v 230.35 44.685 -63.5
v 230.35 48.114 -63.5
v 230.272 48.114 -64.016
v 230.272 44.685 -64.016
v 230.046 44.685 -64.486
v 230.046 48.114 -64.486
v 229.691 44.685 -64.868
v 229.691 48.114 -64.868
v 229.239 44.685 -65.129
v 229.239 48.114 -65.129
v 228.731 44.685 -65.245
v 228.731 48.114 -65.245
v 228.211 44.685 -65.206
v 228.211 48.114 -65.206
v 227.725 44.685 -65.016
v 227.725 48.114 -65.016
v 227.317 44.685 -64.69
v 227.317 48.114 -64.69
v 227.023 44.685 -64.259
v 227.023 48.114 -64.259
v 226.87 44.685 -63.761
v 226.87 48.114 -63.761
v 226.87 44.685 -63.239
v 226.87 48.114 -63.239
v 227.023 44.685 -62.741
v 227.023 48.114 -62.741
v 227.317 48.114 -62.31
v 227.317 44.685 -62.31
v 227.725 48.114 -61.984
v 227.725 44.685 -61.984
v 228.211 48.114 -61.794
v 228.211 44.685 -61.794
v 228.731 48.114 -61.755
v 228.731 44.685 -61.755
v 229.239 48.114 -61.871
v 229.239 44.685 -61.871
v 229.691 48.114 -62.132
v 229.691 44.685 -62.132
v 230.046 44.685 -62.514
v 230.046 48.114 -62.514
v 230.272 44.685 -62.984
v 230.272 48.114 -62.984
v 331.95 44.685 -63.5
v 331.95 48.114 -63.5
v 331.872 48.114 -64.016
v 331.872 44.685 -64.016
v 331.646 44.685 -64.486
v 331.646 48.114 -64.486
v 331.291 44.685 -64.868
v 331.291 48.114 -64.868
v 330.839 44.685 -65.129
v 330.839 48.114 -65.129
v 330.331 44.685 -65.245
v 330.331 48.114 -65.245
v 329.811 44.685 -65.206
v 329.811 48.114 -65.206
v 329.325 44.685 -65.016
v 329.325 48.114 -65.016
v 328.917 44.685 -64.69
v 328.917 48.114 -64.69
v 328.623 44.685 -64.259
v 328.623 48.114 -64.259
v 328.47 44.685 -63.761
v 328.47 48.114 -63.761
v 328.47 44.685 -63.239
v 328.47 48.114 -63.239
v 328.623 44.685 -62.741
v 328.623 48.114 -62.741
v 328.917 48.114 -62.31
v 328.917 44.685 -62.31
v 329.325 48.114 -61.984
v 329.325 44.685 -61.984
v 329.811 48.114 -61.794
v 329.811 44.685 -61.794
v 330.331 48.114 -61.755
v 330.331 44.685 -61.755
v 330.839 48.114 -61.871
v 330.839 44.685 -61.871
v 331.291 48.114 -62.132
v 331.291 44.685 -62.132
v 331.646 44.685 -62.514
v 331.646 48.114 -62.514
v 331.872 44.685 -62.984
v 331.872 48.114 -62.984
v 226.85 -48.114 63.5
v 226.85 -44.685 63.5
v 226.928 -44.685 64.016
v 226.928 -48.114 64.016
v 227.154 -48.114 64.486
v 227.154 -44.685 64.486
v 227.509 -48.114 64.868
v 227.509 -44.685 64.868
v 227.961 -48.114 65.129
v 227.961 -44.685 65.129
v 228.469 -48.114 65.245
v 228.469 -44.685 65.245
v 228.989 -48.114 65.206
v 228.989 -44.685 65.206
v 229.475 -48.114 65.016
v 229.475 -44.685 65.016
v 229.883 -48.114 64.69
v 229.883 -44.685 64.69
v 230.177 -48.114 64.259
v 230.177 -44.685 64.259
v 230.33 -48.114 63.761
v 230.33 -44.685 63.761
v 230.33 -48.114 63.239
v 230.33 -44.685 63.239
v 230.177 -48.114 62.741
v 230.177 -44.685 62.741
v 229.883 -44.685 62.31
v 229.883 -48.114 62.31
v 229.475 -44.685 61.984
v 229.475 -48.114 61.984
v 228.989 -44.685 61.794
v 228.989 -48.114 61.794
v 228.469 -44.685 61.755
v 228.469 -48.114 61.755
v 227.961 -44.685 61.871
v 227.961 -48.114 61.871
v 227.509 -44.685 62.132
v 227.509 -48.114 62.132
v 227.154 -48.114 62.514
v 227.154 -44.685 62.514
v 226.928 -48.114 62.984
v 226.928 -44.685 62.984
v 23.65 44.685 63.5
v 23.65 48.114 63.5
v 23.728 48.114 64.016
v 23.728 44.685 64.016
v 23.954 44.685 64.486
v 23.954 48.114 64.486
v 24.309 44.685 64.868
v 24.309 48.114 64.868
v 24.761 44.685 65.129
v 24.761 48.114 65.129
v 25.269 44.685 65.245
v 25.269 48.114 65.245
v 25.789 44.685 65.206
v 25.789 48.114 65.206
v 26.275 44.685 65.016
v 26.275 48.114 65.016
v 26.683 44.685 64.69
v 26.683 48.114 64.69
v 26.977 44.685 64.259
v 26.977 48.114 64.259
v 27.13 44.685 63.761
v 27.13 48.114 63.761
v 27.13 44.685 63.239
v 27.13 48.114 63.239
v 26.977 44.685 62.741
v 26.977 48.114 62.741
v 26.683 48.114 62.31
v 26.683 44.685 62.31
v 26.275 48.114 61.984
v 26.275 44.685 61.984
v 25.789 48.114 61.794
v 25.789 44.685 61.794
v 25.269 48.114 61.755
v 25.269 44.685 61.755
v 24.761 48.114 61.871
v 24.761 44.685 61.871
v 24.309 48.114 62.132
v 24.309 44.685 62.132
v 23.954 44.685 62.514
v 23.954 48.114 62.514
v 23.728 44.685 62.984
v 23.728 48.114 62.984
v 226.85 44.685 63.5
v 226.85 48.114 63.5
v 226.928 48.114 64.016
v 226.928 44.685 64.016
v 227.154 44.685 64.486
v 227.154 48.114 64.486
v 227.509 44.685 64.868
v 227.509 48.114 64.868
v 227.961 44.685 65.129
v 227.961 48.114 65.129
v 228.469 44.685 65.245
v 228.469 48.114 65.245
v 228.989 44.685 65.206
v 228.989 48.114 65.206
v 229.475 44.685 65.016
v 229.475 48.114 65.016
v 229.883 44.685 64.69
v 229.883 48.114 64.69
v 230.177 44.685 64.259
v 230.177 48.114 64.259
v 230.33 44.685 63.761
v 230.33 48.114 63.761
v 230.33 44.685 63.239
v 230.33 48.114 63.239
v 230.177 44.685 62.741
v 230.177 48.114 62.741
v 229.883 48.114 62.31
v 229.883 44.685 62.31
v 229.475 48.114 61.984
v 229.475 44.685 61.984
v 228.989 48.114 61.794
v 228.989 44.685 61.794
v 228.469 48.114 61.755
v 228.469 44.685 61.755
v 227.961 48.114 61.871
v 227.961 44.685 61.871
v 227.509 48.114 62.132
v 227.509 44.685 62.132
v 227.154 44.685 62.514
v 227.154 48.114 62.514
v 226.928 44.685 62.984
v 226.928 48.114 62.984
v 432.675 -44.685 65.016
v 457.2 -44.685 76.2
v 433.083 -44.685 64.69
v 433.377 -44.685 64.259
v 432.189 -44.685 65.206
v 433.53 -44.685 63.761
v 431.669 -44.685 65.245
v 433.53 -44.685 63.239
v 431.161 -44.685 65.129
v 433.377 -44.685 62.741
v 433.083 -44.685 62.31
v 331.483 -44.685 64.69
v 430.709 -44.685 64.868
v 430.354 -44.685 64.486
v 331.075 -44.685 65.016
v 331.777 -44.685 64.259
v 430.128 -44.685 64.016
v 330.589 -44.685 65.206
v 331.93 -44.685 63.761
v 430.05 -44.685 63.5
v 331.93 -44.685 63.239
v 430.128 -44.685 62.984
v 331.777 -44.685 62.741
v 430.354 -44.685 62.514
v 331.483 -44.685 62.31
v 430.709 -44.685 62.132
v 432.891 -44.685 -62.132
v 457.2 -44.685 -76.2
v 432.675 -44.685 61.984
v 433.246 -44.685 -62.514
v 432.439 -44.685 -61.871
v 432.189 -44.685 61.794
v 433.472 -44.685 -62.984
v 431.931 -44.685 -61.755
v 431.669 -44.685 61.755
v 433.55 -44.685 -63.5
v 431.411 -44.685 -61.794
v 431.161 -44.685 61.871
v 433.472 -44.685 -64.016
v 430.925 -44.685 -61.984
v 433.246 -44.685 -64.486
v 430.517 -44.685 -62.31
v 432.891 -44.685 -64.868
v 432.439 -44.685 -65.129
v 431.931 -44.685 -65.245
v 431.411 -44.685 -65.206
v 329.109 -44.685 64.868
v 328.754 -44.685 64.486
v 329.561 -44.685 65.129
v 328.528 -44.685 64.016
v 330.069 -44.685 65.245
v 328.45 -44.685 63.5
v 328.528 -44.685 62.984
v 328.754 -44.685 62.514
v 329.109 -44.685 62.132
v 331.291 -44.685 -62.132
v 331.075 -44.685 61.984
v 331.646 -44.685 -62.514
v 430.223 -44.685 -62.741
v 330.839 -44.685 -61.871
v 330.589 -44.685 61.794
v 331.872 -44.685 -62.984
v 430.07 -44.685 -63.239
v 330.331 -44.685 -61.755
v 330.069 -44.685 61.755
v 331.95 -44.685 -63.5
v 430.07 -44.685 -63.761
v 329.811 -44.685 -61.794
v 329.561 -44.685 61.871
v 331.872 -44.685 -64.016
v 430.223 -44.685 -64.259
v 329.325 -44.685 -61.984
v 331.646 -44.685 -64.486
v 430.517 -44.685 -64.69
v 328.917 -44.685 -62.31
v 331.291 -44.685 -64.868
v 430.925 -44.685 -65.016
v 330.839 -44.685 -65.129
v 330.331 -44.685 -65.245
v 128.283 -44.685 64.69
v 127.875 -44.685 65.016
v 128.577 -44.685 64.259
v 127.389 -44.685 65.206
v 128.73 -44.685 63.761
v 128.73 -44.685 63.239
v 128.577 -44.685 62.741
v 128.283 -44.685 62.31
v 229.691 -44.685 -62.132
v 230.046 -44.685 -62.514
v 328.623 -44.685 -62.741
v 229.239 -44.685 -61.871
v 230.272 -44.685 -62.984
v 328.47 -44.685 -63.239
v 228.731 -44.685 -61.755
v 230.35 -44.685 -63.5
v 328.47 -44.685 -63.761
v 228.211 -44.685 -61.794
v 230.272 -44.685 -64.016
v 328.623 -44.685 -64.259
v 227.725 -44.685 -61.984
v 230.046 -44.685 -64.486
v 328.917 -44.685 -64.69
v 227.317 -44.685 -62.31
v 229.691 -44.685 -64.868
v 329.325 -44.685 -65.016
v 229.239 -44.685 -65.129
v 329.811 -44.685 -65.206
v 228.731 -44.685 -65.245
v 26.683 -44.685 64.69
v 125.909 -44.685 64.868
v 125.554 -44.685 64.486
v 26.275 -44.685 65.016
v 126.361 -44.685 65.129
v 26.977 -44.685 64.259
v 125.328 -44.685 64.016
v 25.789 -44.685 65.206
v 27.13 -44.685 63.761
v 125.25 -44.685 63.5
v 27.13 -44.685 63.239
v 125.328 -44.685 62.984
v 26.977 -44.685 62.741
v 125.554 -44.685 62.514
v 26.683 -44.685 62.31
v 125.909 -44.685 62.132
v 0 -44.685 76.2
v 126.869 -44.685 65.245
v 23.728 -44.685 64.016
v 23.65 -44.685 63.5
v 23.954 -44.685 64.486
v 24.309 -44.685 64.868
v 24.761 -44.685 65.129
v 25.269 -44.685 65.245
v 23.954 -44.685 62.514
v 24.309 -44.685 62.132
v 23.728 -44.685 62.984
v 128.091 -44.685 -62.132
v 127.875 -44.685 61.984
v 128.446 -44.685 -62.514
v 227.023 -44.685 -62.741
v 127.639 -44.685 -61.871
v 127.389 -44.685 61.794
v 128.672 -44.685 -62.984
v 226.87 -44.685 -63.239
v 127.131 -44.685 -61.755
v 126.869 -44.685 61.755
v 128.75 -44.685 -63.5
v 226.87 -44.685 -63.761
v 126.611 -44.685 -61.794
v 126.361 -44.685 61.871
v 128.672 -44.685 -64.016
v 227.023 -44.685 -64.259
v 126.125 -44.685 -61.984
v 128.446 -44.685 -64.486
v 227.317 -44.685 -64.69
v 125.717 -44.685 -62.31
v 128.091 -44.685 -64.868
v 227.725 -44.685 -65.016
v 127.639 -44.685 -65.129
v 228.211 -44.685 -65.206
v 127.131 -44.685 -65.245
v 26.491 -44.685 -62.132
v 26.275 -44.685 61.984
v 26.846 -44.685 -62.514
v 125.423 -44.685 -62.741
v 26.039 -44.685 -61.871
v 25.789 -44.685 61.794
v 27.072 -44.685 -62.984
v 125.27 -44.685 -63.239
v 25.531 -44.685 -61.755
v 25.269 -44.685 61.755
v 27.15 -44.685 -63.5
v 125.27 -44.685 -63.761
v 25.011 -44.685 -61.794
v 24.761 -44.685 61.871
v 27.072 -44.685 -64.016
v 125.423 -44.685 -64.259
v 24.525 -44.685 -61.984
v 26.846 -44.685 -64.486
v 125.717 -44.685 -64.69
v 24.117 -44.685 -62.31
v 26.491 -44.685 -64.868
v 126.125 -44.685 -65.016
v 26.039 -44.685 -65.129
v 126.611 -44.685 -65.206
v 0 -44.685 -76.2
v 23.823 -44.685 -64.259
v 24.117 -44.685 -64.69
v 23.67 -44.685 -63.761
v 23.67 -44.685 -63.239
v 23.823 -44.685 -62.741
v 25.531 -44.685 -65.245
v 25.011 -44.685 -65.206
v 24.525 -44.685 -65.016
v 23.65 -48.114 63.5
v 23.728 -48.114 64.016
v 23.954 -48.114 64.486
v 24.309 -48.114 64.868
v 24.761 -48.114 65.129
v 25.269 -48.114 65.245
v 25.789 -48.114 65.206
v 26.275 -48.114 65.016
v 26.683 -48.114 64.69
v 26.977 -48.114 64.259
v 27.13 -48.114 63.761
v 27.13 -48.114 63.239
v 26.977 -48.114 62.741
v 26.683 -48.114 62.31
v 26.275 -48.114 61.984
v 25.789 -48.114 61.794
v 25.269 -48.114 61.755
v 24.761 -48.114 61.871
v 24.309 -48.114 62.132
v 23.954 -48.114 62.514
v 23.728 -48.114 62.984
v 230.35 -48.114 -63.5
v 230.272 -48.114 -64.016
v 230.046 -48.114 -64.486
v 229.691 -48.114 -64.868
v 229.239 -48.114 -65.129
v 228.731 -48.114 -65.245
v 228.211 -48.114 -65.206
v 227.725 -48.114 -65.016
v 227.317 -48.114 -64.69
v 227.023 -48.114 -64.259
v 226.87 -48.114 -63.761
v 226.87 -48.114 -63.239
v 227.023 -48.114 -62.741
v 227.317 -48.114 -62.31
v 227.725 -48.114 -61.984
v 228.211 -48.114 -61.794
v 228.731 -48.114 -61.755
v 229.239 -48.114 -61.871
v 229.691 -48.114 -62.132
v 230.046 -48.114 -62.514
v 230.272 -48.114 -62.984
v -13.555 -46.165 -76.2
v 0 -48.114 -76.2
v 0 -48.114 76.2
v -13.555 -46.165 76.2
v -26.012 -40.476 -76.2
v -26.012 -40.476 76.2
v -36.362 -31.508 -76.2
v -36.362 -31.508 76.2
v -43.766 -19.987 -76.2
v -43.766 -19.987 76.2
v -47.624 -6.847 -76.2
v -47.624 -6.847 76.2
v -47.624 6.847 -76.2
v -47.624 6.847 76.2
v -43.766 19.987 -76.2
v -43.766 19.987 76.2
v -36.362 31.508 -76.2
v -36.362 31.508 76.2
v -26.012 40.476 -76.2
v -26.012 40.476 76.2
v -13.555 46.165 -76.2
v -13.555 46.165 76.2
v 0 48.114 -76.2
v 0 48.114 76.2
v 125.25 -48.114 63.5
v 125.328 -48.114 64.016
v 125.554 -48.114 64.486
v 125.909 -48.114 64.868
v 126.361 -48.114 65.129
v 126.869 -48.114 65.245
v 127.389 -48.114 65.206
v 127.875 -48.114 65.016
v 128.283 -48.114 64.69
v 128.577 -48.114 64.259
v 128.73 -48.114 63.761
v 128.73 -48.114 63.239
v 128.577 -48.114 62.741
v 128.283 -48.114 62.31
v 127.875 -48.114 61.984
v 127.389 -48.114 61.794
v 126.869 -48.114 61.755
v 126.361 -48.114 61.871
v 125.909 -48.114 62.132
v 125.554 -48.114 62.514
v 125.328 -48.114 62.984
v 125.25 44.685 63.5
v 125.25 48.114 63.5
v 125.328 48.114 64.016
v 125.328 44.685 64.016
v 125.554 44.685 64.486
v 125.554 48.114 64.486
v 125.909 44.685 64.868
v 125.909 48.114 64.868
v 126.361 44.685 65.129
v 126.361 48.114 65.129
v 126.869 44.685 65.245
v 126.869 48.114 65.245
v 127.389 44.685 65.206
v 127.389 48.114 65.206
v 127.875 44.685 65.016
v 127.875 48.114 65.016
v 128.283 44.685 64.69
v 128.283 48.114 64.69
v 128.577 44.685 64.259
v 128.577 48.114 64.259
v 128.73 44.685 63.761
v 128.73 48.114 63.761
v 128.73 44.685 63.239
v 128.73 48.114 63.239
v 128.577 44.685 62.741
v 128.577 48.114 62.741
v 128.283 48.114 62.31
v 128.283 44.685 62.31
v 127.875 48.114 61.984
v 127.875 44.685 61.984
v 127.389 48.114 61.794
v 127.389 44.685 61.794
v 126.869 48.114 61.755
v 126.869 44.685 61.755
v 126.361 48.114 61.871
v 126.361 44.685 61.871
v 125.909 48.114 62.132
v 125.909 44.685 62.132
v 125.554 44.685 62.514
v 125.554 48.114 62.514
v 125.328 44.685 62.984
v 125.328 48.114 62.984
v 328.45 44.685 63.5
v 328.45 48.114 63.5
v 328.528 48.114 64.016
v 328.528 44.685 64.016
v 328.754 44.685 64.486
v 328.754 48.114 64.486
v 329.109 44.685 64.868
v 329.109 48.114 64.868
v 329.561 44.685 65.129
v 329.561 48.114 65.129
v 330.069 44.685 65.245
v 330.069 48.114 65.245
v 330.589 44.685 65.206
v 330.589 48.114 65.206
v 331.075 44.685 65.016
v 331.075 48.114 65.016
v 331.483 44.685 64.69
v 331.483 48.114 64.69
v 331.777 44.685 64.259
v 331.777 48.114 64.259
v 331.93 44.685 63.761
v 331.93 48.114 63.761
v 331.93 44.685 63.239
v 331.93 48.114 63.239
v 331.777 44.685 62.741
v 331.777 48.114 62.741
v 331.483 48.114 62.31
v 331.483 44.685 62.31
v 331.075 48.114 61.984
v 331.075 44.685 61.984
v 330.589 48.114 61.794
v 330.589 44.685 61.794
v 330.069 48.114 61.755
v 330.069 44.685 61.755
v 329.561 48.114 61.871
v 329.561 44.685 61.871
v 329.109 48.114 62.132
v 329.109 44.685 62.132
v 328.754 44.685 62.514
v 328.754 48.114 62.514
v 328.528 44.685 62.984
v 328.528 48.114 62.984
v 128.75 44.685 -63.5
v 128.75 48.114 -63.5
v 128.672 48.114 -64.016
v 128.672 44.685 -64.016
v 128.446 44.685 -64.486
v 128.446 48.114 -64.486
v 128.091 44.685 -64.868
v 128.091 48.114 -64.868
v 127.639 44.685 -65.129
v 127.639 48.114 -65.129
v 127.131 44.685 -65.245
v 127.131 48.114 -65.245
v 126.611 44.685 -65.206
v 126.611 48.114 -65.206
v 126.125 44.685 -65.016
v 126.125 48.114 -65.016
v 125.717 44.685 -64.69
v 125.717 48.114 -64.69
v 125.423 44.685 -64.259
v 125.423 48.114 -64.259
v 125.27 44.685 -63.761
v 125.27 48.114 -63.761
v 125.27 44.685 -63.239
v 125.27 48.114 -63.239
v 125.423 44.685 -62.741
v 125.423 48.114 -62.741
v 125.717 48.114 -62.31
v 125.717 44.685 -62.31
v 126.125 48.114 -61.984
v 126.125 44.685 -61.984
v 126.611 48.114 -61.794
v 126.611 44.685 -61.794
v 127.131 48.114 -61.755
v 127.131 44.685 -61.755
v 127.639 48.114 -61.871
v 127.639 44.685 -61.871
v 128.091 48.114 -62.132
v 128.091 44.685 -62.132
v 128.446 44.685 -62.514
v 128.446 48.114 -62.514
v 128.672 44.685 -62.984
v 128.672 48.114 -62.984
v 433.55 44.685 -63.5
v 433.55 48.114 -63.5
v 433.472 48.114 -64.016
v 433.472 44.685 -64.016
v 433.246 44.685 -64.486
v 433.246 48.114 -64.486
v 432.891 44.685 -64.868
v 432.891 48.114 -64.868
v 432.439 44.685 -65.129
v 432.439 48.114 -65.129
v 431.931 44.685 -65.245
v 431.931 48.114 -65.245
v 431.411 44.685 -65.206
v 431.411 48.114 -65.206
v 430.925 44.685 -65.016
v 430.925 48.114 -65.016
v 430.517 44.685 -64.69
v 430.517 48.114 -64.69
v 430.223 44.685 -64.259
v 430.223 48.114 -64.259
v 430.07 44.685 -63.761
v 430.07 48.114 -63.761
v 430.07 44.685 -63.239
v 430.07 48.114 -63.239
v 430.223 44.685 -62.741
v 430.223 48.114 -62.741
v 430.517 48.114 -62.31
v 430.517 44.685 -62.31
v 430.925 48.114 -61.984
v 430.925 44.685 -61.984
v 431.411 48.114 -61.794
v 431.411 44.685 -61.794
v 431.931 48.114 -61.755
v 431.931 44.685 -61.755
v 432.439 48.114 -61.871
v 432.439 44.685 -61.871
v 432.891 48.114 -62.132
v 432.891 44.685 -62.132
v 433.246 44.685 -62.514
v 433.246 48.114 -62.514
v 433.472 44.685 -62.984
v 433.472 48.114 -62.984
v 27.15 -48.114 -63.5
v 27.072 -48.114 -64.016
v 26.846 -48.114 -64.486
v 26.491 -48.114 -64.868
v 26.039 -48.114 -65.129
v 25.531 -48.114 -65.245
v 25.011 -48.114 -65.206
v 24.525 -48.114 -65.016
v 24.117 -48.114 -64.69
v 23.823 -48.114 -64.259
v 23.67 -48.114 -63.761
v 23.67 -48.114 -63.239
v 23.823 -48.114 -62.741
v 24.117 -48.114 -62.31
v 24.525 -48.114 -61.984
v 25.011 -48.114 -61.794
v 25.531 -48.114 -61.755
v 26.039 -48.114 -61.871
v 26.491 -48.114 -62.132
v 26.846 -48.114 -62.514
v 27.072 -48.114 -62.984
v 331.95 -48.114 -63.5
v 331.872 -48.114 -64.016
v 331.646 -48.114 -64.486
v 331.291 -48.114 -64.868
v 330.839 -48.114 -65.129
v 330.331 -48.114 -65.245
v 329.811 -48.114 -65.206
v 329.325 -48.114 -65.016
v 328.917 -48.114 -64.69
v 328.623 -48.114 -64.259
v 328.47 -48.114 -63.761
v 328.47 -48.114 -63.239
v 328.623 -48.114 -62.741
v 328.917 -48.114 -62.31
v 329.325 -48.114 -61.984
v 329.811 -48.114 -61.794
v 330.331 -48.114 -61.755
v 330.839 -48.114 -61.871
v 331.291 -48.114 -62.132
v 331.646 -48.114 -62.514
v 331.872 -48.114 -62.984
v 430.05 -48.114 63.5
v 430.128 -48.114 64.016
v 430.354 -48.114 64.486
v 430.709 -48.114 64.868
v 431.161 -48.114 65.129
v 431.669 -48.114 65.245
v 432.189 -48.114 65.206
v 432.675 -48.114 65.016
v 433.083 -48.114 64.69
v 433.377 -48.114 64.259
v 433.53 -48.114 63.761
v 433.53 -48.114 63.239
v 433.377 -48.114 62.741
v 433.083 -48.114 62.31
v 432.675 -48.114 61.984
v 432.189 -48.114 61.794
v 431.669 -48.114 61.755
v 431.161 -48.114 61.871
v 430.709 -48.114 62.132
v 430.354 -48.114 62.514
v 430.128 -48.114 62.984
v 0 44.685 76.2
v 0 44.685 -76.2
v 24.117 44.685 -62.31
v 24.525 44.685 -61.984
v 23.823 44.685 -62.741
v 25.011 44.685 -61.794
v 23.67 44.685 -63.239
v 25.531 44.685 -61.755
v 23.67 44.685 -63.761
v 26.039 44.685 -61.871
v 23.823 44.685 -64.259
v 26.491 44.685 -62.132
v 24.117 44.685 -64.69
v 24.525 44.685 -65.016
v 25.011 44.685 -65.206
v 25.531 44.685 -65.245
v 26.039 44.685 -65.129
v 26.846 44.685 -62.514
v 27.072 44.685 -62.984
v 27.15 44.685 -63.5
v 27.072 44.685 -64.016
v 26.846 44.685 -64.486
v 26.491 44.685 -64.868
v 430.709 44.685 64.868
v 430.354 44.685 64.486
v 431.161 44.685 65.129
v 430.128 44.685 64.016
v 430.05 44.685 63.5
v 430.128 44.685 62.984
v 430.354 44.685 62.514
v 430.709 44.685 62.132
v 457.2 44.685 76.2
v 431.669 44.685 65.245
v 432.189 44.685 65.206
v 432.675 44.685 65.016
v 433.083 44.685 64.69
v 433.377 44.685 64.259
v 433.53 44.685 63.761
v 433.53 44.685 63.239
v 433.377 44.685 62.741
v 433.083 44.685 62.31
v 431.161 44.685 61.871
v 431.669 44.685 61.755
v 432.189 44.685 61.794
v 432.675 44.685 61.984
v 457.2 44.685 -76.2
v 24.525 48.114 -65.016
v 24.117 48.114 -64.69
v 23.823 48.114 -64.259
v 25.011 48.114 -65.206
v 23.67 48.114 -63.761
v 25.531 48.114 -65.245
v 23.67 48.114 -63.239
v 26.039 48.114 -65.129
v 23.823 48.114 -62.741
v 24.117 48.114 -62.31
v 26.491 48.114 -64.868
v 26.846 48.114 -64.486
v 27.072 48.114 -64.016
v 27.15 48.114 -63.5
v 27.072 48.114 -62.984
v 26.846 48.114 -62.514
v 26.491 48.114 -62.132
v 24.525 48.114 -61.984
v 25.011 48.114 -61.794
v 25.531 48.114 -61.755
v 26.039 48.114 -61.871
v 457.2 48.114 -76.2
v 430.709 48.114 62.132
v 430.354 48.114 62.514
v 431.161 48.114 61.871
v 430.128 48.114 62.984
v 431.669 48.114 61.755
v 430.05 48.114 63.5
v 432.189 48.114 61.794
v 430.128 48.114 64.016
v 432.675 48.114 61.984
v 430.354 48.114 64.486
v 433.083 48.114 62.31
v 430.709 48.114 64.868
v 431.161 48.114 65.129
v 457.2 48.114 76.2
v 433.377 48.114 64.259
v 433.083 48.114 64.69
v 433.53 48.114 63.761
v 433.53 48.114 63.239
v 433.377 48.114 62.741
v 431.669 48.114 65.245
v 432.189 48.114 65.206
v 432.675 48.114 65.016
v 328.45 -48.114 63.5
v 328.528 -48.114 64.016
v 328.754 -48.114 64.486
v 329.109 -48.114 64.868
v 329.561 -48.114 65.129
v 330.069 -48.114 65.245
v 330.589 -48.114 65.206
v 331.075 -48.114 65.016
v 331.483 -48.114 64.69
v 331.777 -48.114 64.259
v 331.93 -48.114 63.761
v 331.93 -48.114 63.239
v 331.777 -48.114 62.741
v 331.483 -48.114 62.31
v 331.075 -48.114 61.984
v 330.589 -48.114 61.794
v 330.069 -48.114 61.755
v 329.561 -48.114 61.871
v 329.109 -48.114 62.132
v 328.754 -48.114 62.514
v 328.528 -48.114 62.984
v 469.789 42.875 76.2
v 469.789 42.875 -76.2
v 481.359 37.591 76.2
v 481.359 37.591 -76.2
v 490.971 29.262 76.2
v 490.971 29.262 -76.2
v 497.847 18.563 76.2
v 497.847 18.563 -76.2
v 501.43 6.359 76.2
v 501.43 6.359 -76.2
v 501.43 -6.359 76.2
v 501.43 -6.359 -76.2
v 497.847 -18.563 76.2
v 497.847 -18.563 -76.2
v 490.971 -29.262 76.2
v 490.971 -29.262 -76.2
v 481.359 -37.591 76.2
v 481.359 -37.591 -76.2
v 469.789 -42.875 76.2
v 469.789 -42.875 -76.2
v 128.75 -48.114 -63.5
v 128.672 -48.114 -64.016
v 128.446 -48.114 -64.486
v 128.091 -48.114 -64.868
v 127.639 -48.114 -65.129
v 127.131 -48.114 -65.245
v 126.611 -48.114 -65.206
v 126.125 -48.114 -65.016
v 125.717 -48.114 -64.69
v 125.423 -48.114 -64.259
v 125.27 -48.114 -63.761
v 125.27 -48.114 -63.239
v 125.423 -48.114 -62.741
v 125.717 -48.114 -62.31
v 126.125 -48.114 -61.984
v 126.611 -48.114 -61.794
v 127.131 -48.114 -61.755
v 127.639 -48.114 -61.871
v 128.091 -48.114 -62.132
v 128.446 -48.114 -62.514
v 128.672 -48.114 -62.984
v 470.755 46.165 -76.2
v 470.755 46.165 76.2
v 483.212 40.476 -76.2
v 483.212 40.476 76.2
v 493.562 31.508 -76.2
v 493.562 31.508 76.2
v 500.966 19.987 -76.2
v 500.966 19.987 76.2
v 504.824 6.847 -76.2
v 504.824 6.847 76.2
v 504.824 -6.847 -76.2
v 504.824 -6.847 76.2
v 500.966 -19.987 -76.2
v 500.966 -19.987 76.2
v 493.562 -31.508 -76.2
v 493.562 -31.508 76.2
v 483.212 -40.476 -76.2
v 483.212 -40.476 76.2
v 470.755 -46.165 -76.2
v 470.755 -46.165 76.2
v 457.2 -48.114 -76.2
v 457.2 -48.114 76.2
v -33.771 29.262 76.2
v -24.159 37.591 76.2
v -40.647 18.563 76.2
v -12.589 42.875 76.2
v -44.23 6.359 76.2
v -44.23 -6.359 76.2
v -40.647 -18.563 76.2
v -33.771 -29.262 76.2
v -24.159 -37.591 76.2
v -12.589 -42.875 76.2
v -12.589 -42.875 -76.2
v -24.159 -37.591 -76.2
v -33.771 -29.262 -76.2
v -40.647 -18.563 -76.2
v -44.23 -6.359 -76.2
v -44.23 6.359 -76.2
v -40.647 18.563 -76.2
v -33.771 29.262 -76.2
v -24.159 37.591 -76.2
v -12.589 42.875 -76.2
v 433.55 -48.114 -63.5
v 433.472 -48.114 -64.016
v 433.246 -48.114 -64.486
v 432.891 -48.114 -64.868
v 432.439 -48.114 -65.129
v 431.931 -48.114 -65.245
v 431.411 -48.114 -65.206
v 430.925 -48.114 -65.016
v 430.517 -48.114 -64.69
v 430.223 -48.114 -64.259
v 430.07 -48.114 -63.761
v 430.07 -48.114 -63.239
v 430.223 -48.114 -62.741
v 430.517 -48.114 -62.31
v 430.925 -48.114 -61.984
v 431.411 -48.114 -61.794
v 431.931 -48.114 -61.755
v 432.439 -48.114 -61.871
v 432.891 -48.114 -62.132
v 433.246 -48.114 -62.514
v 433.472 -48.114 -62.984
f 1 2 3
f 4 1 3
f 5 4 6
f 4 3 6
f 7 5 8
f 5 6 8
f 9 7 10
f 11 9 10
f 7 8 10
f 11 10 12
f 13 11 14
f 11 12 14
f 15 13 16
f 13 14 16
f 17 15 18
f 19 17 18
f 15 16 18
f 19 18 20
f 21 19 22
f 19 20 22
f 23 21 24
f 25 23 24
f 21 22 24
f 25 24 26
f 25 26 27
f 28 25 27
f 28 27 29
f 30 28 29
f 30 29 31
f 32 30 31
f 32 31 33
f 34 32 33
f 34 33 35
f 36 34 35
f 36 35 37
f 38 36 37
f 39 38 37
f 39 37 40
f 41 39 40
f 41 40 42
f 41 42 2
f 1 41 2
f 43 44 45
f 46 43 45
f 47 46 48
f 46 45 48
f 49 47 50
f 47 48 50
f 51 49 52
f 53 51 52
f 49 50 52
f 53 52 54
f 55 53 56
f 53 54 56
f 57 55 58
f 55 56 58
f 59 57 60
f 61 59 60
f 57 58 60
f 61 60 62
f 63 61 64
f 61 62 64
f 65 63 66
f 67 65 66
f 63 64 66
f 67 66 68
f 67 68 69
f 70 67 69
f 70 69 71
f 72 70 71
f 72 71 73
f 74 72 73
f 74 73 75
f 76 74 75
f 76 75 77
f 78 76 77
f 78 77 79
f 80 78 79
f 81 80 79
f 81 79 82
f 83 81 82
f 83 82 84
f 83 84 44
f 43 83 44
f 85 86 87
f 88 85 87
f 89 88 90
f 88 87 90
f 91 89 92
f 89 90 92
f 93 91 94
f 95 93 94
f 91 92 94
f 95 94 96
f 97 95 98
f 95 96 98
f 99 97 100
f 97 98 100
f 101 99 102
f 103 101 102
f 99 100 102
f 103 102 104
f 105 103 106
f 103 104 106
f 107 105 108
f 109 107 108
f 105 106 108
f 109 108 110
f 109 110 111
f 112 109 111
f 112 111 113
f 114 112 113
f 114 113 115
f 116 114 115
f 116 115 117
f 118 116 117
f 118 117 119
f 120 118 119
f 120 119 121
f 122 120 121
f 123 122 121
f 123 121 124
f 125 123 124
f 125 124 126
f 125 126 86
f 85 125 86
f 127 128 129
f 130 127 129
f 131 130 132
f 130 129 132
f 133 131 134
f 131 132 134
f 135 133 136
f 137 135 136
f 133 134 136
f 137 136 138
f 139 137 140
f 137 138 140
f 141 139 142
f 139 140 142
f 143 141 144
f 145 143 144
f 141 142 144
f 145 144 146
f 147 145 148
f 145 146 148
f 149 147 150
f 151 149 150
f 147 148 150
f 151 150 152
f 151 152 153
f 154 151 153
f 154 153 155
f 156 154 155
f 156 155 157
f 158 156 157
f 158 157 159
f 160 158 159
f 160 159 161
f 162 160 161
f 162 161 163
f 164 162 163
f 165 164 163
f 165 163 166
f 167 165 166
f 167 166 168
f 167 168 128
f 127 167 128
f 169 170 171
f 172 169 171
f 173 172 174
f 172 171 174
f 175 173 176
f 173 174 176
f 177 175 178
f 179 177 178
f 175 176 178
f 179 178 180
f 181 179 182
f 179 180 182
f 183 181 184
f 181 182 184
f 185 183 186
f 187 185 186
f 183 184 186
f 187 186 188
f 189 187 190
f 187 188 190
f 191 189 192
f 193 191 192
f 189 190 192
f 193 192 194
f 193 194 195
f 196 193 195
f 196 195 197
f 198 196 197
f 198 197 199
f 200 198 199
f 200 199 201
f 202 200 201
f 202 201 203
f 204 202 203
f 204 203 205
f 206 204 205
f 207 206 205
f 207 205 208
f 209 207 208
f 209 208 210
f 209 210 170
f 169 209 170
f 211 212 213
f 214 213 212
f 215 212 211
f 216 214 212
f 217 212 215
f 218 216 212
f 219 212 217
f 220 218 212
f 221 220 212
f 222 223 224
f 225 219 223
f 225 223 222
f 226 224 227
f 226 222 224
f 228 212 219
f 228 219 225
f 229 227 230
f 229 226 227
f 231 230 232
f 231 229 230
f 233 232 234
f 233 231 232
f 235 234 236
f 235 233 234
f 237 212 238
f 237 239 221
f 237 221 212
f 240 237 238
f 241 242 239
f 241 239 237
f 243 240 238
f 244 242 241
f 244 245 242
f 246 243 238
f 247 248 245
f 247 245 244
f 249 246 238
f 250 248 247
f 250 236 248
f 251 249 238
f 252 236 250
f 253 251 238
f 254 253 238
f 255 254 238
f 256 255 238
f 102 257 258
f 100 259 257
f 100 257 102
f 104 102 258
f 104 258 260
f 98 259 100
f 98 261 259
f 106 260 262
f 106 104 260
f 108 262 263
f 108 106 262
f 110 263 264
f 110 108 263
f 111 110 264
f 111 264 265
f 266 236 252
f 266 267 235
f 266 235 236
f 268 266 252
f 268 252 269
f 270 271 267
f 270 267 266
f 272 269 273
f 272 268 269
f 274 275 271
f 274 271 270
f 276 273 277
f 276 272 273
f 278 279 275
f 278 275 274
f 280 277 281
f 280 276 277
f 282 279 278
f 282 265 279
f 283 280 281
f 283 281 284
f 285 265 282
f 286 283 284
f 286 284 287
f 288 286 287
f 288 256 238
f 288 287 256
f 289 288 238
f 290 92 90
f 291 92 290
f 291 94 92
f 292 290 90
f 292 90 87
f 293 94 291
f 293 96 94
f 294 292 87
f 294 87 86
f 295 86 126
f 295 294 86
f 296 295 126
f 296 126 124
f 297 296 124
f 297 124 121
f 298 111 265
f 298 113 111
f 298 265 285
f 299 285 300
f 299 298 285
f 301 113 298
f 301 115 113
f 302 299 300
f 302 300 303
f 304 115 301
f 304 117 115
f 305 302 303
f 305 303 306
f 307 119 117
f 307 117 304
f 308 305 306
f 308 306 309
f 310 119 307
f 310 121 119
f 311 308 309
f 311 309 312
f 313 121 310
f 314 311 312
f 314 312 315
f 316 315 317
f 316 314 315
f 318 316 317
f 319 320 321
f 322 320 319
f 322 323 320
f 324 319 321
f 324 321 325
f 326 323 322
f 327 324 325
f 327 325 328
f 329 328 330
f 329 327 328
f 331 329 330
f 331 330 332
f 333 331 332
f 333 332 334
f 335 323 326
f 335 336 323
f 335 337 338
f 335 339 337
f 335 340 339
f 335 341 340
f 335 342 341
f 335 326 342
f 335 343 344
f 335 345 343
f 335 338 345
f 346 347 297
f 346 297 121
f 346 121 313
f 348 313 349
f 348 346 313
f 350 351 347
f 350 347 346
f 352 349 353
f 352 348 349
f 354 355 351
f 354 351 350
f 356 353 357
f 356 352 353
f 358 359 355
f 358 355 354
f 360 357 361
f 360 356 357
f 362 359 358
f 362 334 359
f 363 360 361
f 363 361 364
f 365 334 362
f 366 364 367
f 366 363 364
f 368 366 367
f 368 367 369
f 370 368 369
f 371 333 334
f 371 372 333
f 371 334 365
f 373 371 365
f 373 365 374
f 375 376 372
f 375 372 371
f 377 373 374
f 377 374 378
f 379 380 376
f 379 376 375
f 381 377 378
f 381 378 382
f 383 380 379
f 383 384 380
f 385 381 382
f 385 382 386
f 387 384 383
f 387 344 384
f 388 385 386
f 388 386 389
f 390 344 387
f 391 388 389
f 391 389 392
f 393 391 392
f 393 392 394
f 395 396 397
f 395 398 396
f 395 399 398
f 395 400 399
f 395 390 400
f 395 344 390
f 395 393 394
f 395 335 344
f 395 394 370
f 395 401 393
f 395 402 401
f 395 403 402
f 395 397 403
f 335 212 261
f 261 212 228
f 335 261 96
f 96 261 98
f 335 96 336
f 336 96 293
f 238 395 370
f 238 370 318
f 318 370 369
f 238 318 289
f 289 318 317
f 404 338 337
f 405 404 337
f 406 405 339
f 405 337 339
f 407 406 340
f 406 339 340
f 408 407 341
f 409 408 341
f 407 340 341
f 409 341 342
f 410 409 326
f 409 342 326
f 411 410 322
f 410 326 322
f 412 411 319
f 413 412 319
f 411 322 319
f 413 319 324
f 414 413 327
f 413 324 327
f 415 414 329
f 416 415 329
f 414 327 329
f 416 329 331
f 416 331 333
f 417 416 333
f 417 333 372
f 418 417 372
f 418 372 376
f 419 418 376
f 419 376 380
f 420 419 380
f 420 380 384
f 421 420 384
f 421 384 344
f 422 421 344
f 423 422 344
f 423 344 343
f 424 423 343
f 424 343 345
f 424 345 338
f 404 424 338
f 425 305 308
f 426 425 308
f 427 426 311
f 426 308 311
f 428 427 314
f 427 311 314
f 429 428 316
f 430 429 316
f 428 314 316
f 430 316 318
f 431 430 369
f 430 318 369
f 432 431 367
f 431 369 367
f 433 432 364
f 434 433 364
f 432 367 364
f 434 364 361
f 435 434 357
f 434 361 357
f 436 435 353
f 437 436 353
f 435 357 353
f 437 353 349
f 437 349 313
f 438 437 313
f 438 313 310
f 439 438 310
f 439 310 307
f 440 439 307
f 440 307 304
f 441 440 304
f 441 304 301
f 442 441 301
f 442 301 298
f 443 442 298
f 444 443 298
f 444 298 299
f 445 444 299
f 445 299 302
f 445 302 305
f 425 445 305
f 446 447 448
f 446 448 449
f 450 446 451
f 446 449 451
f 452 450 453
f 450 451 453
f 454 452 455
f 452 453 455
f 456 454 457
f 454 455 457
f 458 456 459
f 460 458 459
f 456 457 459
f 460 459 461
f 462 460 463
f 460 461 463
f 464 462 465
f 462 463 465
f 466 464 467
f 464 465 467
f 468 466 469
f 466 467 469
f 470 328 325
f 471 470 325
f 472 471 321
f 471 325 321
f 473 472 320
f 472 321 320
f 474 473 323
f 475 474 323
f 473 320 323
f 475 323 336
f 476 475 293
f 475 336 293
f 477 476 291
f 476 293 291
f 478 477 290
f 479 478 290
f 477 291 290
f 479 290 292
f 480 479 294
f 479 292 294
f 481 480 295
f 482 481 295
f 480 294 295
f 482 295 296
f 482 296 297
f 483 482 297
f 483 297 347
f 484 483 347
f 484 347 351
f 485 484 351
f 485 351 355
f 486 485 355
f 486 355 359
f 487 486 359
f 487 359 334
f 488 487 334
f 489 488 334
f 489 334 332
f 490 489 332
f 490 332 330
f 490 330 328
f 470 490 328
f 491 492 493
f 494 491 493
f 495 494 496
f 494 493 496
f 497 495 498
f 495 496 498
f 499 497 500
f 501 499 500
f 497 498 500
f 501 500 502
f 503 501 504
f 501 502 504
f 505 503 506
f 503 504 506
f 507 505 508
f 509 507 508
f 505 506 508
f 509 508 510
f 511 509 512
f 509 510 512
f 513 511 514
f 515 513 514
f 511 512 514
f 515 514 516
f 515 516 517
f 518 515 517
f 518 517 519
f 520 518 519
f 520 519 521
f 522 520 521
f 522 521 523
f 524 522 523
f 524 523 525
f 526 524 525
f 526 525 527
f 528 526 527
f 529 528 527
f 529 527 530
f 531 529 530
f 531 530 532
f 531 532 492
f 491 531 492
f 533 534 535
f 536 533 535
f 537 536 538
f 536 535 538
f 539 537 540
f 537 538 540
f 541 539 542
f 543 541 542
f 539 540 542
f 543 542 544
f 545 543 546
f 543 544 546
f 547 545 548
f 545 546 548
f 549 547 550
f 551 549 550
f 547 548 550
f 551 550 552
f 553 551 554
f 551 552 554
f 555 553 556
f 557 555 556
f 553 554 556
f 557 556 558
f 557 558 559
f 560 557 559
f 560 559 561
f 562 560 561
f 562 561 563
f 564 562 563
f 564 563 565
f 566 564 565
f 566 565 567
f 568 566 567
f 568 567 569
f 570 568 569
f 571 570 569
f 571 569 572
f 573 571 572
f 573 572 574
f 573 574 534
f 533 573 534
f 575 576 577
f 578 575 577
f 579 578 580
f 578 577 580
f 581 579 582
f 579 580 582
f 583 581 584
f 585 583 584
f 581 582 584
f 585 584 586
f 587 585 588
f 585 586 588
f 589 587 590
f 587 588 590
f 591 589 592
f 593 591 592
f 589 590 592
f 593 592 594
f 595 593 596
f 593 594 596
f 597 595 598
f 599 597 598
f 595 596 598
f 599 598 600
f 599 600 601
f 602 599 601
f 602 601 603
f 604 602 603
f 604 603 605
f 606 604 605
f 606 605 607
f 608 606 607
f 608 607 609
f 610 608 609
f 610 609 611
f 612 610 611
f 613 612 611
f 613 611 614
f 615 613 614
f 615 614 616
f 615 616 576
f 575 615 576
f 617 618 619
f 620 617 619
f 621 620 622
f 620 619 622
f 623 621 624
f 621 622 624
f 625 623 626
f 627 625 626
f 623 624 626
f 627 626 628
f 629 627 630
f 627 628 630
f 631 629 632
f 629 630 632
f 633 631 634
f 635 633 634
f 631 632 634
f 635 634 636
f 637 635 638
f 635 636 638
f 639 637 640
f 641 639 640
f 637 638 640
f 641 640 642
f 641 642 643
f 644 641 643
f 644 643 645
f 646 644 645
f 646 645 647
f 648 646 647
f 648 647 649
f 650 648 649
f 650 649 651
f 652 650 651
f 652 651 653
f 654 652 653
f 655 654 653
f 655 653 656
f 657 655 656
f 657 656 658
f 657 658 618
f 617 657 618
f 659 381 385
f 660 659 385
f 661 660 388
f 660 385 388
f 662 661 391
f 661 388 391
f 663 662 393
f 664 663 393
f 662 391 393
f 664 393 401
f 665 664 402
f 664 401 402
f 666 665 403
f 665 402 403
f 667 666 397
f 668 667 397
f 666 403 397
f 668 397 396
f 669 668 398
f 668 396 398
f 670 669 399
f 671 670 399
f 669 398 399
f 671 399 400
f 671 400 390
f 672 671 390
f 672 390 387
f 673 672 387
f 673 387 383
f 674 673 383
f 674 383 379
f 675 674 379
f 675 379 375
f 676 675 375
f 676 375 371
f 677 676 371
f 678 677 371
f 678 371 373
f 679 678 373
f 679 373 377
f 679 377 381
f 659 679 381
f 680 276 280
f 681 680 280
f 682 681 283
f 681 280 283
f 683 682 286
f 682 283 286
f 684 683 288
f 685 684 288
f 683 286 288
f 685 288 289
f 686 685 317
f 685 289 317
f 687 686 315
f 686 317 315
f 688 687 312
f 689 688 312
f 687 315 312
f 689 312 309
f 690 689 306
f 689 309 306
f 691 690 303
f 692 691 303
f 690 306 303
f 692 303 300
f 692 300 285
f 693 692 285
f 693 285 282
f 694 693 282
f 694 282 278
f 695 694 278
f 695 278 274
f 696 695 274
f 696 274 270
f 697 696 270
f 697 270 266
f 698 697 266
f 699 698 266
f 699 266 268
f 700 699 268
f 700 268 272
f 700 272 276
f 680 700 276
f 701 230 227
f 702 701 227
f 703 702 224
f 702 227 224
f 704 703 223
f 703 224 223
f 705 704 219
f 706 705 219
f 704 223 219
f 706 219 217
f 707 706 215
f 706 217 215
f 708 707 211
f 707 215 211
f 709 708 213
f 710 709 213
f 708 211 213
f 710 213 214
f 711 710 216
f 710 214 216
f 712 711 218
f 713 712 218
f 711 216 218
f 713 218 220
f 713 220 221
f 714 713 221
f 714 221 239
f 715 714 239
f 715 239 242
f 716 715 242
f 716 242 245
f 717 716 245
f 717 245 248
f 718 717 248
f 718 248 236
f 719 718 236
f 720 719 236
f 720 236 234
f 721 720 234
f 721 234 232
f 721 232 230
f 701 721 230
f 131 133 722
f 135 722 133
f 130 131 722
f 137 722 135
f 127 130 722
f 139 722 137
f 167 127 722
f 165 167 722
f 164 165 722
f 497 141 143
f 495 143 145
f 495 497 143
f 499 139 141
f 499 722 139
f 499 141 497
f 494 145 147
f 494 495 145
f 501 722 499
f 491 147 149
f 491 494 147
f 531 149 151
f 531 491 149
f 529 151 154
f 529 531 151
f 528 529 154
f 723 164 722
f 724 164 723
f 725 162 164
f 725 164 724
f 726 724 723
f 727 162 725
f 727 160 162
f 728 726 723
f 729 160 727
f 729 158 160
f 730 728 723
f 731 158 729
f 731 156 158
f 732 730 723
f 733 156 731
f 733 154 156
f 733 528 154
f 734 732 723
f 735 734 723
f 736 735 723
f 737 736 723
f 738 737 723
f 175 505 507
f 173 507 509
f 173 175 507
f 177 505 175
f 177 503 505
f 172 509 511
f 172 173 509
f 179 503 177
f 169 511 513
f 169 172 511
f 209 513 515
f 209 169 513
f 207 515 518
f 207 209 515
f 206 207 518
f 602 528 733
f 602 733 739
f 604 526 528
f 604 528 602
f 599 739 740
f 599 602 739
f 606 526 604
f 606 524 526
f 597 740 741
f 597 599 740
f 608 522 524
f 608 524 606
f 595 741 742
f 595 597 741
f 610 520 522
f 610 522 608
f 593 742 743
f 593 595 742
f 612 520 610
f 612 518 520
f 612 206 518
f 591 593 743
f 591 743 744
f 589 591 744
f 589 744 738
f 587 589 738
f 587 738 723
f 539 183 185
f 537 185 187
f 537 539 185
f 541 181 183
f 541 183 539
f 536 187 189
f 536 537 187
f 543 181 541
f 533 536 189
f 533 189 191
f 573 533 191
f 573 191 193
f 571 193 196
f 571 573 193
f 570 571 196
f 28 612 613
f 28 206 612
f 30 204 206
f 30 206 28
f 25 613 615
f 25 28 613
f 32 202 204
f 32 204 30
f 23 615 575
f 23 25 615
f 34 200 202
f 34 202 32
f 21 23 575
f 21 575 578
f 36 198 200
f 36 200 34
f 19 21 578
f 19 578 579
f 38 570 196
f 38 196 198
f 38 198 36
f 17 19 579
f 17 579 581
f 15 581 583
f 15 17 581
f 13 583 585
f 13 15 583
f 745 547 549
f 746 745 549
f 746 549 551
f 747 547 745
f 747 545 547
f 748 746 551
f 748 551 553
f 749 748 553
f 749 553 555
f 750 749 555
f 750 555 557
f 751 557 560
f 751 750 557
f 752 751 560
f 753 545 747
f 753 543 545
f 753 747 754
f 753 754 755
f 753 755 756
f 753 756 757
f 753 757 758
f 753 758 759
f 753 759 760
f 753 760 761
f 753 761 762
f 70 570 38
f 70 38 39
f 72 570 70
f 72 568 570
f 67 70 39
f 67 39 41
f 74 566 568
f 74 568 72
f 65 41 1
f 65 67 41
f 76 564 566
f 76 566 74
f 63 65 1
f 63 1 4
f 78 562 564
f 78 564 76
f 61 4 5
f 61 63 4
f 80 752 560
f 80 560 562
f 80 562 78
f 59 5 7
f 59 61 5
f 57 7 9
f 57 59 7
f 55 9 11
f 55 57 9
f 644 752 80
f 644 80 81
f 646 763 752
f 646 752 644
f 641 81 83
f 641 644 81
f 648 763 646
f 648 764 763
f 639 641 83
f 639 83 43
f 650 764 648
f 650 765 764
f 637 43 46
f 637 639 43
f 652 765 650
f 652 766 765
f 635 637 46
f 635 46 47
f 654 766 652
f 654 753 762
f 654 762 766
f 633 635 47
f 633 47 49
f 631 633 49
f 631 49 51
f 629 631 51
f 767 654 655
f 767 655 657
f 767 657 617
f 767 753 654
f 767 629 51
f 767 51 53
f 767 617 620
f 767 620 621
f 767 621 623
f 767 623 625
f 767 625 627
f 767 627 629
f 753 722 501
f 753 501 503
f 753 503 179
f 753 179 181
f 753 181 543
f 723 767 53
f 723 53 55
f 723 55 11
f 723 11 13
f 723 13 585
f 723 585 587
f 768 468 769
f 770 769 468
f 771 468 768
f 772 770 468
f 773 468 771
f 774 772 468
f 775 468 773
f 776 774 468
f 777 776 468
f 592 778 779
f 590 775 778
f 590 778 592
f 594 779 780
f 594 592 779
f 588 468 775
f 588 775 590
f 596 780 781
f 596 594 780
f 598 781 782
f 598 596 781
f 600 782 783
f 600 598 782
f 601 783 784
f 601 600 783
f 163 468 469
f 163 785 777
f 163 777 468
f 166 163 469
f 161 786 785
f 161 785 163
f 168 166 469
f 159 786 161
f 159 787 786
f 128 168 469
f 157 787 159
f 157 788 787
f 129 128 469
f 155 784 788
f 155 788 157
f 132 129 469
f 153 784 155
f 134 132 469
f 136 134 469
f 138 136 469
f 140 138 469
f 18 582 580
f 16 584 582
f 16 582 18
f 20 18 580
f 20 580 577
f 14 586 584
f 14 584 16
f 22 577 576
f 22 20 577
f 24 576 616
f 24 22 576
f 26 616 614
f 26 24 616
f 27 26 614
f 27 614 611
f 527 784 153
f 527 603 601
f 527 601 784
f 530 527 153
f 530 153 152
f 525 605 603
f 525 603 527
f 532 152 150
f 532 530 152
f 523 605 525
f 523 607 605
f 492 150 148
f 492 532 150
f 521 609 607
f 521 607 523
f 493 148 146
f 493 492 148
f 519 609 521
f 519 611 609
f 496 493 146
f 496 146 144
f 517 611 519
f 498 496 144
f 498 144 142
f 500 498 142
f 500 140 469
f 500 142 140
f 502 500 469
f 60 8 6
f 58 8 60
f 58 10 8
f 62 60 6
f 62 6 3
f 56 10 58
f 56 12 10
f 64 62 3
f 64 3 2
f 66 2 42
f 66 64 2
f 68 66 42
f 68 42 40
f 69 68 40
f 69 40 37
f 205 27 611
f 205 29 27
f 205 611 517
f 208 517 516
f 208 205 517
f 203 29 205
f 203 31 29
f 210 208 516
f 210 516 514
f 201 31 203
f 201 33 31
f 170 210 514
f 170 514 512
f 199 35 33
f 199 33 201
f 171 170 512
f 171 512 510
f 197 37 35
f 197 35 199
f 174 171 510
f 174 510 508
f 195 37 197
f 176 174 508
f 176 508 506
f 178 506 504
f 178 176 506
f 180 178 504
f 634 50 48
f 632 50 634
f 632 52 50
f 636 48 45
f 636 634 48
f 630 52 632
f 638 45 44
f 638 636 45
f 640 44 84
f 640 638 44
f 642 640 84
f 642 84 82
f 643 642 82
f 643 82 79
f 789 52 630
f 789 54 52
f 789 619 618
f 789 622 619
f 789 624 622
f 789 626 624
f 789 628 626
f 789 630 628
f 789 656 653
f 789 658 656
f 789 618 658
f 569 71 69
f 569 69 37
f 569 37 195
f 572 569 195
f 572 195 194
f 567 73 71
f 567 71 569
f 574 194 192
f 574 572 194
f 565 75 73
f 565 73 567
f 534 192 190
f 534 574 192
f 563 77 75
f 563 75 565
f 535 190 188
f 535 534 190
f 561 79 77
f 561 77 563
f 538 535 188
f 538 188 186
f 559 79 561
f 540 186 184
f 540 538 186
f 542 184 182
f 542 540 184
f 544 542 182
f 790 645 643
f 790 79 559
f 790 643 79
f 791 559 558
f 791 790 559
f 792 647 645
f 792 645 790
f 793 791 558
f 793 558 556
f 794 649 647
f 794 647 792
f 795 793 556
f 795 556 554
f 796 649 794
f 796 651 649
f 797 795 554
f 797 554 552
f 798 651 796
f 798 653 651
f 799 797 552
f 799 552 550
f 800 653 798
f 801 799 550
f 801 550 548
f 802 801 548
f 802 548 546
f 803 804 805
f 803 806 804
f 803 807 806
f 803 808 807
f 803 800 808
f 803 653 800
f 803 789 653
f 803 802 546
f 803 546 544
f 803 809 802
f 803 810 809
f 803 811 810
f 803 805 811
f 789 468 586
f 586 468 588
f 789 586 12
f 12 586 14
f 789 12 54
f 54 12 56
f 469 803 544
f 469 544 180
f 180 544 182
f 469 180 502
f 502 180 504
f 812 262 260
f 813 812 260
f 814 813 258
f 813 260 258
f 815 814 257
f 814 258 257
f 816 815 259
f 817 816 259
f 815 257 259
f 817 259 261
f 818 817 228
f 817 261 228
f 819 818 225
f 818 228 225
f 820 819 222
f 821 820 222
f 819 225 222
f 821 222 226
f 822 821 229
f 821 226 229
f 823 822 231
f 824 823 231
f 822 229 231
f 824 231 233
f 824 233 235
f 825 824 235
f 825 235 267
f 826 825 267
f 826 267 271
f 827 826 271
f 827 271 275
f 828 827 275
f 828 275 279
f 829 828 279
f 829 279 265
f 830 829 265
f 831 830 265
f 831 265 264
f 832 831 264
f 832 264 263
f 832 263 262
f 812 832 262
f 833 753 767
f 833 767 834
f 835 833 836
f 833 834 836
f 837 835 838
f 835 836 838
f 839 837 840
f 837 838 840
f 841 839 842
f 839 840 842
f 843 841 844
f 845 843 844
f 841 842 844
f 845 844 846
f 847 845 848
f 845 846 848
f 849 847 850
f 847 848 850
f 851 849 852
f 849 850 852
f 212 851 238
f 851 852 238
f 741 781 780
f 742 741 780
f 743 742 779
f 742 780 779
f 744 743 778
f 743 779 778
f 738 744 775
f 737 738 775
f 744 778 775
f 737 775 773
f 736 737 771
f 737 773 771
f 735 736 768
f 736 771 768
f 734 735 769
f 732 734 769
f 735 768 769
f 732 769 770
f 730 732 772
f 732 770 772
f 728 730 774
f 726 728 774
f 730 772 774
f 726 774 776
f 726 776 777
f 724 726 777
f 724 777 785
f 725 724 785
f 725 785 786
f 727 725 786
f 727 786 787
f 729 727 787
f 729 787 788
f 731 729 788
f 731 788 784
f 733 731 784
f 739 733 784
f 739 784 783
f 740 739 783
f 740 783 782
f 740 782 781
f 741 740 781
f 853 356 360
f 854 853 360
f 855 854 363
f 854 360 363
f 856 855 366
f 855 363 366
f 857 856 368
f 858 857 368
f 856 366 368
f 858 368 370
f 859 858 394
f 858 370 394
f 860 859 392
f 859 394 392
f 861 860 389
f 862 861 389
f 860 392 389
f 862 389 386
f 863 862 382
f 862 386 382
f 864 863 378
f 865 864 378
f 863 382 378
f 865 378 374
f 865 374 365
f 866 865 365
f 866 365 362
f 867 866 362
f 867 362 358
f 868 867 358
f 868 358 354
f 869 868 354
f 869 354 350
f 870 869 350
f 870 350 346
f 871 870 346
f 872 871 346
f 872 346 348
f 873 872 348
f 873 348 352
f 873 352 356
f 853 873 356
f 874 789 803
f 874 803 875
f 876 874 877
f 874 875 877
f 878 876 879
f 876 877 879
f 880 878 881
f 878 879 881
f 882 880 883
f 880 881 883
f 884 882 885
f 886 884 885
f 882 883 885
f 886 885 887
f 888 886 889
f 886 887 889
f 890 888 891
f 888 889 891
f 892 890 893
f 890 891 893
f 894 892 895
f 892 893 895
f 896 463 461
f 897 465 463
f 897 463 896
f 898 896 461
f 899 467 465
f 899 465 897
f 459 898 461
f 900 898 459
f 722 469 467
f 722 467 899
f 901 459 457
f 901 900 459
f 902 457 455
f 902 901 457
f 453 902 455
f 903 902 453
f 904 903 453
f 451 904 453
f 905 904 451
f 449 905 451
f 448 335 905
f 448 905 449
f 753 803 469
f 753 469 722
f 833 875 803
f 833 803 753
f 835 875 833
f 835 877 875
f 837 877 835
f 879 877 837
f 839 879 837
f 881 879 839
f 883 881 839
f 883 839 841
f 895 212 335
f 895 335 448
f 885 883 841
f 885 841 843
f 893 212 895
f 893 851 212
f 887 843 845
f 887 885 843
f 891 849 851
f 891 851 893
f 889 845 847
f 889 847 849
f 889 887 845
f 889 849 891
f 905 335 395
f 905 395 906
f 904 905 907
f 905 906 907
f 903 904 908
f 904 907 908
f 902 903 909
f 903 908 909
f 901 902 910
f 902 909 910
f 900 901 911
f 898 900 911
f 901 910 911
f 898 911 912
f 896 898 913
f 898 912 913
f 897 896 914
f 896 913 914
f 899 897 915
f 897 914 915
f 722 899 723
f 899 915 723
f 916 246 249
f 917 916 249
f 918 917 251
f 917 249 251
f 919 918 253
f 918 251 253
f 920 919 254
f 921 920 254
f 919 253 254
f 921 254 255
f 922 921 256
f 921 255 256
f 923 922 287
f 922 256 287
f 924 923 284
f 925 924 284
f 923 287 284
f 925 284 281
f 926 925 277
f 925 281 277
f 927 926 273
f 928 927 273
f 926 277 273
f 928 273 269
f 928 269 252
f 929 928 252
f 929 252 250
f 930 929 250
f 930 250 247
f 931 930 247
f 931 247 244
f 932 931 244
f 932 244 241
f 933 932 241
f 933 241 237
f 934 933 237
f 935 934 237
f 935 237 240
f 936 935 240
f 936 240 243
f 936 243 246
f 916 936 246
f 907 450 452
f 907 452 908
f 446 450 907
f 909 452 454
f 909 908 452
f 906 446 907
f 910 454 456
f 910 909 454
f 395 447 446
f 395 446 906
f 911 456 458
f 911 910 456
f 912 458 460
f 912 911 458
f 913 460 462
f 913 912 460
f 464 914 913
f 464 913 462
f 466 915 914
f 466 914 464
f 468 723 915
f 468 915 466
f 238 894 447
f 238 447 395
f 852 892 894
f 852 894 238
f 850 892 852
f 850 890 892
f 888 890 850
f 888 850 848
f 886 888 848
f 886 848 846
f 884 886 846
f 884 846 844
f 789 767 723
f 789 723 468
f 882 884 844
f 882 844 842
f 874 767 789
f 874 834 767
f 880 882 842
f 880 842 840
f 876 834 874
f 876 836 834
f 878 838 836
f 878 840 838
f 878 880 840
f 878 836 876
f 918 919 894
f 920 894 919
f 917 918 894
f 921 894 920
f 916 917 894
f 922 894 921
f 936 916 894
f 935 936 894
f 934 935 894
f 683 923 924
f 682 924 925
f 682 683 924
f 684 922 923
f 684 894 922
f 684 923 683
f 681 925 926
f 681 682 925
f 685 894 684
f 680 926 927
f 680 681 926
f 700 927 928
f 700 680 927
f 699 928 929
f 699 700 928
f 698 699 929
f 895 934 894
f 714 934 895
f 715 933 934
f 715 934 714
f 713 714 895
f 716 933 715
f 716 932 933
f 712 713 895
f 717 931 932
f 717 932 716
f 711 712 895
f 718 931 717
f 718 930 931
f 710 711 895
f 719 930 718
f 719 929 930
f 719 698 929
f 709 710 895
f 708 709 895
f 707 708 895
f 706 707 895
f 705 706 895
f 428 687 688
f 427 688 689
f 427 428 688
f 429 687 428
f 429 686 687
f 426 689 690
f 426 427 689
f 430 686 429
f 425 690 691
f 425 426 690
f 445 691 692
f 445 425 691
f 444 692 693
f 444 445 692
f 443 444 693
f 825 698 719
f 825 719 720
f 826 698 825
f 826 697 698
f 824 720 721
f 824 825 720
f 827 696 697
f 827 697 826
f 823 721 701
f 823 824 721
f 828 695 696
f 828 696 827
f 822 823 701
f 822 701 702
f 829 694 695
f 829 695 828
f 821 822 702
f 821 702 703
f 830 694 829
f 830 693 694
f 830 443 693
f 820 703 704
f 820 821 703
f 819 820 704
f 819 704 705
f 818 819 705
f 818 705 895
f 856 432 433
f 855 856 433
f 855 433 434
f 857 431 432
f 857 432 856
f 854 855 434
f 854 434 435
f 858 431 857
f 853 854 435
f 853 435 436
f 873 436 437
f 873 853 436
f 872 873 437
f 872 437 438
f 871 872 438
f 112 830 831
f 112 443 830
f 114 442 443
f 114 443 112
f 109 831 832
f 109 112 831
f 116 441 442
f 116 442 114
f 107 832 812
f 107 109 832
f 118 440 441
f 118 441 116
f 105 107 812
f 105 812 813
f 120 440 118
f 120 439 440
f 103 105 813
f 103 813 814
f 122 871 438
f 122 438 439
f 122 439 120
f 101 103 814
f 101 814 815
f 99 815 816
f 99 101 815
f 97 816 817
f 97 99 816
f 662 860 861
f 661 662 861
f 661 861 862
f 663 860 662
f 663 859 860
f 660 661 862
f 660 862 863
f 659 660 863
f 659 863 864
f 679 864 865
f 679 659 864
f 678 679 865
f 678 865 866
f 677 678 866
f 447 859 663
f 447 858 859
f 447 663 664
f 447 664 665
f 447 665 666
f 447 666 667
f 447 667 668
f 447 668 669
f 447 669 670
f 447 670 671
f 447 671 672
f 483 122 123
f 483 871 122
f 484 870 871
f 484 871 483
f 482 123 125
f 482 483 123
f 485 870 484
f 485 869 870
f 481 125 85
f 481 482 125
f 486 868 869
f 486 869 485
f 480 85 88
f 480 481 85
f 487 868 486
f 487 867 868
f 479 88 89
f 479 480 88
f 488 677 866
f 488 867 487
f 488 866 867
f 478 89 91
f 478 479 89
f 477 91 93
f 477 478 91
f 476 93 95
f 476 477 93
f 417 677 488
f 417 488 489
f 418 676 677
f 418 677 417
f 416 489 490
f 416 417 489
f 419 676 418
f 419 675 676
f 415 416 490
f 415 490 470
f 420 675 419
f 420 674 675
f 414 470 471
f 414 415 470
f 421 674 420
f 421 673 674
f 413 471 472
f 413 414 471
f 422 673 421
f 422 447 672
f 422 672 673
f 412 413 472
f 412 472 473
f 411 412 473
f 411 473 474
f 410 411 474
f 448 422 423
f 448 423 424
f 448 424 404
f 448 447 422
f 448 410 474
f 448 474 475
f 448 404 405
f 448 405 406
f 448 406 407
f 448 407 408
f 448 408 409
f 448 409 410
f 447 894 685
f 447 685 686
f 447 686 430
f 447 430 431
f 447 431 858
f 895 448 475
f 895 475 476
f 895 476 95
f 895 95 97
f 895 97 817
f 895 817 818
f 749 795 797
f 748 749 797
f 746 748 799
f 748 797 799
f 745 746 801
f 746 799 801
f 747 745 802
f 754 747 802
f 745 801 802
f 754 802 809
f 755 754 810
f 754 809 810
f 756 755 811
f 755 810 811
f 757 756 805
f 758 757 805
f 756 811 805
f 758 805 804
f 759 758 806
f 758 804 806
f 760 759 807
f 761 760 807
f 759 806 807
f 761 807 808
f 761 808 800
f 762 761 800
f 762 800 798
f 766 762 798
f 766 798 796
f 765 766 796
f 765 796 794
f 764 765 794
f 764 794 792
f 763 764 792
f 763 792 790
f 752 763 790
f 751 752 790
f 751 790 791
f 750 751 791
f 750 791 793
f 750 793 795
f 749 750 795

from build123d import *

# Parameters (mm, degrees)
SKETCH2_W          = 152.4
SKETCH2_H          = 3.429
SKETCH3_R          = 1.75
CUT_EXTRUDE1_DEPTH = 521.008112247


with BuildPart() as part:
    # Sweep1: sweep along a path in Sketch1
    with BuildLine(Plane.XY) as sweep1_path:
        Line((0, 46.39945), (457.2, 46.39945))
        ThreePointArc((457.2, 46.39945), (503.59945, 0), (457.2, -46.39945))
        Line((457.2, -46.39945), (0, -46.39945))
        ThreePointArc((0, -46.39945), (-46.39945, 0), (0, 46.39945))
    # Sketch2 → Sweep1 (sweep)
    with BuildSketch(Plane(origin=(0, 0, 0), x_dir=(0, 0, -1), z_dir=(1, 0, 0))):
        with Locations((0, 46.39945)):
            Rectangle(SKETCH2_W, SKETCH2_H)
    sweep(path=sweep1_path.line)

    # Sketch3 → Cut-Extrude1 (cut, through all)
    with BuildSketch(Plane(origin=(0, 48.11395, 0), x_dir=(1, 0, 0), z_dir=(0, 1, 0))):
        with Locations(Location((25.4, -63.5, 0), (0, 0, 180))):
            Circle(SKETCH3_R)
        with Locations((25.4, 63.5)):
            Circle(SKETCH3_R)
        with Locations(Location((127, -63.5, 0), (0, 0, 180))):
            Circle(SKETCH3_R)
        with Locations((127, 63.5)):
            Circle(SKETCH3_R)
        with Locations(Location((228.6, -63.5, 0), (0, 0, 180))):
            Circle(SKETCH3_R)
        with Locations((228.6, 63.5)):
            Circle(SKETCH3_R)
        with Locations(Location((330.2, -63.5, 0), (0, 0, 180))):
            Circle(SKETCH3_R)
        with Locations((330.2, 63.5)):
            Circle(SKETCH3_R)
        with Locations(Location((431.8, -63.5, 0), (0, 0, 180))):
            Circle(SKETCH3_R)
        with Locations((431.8, 63.5)):
            Circle(SKETCH3_R)
        with Locations((533.4, -63.5)):
            Circle(SKETCH3_R)
        with Locations((533.4, 63.5)):
            Circle(SKETCH3_R)
    extrude(amount=-CUT_EXTRUDE1_DEPTH, mode=Mode.SUBTRACT)


solid = part.part
